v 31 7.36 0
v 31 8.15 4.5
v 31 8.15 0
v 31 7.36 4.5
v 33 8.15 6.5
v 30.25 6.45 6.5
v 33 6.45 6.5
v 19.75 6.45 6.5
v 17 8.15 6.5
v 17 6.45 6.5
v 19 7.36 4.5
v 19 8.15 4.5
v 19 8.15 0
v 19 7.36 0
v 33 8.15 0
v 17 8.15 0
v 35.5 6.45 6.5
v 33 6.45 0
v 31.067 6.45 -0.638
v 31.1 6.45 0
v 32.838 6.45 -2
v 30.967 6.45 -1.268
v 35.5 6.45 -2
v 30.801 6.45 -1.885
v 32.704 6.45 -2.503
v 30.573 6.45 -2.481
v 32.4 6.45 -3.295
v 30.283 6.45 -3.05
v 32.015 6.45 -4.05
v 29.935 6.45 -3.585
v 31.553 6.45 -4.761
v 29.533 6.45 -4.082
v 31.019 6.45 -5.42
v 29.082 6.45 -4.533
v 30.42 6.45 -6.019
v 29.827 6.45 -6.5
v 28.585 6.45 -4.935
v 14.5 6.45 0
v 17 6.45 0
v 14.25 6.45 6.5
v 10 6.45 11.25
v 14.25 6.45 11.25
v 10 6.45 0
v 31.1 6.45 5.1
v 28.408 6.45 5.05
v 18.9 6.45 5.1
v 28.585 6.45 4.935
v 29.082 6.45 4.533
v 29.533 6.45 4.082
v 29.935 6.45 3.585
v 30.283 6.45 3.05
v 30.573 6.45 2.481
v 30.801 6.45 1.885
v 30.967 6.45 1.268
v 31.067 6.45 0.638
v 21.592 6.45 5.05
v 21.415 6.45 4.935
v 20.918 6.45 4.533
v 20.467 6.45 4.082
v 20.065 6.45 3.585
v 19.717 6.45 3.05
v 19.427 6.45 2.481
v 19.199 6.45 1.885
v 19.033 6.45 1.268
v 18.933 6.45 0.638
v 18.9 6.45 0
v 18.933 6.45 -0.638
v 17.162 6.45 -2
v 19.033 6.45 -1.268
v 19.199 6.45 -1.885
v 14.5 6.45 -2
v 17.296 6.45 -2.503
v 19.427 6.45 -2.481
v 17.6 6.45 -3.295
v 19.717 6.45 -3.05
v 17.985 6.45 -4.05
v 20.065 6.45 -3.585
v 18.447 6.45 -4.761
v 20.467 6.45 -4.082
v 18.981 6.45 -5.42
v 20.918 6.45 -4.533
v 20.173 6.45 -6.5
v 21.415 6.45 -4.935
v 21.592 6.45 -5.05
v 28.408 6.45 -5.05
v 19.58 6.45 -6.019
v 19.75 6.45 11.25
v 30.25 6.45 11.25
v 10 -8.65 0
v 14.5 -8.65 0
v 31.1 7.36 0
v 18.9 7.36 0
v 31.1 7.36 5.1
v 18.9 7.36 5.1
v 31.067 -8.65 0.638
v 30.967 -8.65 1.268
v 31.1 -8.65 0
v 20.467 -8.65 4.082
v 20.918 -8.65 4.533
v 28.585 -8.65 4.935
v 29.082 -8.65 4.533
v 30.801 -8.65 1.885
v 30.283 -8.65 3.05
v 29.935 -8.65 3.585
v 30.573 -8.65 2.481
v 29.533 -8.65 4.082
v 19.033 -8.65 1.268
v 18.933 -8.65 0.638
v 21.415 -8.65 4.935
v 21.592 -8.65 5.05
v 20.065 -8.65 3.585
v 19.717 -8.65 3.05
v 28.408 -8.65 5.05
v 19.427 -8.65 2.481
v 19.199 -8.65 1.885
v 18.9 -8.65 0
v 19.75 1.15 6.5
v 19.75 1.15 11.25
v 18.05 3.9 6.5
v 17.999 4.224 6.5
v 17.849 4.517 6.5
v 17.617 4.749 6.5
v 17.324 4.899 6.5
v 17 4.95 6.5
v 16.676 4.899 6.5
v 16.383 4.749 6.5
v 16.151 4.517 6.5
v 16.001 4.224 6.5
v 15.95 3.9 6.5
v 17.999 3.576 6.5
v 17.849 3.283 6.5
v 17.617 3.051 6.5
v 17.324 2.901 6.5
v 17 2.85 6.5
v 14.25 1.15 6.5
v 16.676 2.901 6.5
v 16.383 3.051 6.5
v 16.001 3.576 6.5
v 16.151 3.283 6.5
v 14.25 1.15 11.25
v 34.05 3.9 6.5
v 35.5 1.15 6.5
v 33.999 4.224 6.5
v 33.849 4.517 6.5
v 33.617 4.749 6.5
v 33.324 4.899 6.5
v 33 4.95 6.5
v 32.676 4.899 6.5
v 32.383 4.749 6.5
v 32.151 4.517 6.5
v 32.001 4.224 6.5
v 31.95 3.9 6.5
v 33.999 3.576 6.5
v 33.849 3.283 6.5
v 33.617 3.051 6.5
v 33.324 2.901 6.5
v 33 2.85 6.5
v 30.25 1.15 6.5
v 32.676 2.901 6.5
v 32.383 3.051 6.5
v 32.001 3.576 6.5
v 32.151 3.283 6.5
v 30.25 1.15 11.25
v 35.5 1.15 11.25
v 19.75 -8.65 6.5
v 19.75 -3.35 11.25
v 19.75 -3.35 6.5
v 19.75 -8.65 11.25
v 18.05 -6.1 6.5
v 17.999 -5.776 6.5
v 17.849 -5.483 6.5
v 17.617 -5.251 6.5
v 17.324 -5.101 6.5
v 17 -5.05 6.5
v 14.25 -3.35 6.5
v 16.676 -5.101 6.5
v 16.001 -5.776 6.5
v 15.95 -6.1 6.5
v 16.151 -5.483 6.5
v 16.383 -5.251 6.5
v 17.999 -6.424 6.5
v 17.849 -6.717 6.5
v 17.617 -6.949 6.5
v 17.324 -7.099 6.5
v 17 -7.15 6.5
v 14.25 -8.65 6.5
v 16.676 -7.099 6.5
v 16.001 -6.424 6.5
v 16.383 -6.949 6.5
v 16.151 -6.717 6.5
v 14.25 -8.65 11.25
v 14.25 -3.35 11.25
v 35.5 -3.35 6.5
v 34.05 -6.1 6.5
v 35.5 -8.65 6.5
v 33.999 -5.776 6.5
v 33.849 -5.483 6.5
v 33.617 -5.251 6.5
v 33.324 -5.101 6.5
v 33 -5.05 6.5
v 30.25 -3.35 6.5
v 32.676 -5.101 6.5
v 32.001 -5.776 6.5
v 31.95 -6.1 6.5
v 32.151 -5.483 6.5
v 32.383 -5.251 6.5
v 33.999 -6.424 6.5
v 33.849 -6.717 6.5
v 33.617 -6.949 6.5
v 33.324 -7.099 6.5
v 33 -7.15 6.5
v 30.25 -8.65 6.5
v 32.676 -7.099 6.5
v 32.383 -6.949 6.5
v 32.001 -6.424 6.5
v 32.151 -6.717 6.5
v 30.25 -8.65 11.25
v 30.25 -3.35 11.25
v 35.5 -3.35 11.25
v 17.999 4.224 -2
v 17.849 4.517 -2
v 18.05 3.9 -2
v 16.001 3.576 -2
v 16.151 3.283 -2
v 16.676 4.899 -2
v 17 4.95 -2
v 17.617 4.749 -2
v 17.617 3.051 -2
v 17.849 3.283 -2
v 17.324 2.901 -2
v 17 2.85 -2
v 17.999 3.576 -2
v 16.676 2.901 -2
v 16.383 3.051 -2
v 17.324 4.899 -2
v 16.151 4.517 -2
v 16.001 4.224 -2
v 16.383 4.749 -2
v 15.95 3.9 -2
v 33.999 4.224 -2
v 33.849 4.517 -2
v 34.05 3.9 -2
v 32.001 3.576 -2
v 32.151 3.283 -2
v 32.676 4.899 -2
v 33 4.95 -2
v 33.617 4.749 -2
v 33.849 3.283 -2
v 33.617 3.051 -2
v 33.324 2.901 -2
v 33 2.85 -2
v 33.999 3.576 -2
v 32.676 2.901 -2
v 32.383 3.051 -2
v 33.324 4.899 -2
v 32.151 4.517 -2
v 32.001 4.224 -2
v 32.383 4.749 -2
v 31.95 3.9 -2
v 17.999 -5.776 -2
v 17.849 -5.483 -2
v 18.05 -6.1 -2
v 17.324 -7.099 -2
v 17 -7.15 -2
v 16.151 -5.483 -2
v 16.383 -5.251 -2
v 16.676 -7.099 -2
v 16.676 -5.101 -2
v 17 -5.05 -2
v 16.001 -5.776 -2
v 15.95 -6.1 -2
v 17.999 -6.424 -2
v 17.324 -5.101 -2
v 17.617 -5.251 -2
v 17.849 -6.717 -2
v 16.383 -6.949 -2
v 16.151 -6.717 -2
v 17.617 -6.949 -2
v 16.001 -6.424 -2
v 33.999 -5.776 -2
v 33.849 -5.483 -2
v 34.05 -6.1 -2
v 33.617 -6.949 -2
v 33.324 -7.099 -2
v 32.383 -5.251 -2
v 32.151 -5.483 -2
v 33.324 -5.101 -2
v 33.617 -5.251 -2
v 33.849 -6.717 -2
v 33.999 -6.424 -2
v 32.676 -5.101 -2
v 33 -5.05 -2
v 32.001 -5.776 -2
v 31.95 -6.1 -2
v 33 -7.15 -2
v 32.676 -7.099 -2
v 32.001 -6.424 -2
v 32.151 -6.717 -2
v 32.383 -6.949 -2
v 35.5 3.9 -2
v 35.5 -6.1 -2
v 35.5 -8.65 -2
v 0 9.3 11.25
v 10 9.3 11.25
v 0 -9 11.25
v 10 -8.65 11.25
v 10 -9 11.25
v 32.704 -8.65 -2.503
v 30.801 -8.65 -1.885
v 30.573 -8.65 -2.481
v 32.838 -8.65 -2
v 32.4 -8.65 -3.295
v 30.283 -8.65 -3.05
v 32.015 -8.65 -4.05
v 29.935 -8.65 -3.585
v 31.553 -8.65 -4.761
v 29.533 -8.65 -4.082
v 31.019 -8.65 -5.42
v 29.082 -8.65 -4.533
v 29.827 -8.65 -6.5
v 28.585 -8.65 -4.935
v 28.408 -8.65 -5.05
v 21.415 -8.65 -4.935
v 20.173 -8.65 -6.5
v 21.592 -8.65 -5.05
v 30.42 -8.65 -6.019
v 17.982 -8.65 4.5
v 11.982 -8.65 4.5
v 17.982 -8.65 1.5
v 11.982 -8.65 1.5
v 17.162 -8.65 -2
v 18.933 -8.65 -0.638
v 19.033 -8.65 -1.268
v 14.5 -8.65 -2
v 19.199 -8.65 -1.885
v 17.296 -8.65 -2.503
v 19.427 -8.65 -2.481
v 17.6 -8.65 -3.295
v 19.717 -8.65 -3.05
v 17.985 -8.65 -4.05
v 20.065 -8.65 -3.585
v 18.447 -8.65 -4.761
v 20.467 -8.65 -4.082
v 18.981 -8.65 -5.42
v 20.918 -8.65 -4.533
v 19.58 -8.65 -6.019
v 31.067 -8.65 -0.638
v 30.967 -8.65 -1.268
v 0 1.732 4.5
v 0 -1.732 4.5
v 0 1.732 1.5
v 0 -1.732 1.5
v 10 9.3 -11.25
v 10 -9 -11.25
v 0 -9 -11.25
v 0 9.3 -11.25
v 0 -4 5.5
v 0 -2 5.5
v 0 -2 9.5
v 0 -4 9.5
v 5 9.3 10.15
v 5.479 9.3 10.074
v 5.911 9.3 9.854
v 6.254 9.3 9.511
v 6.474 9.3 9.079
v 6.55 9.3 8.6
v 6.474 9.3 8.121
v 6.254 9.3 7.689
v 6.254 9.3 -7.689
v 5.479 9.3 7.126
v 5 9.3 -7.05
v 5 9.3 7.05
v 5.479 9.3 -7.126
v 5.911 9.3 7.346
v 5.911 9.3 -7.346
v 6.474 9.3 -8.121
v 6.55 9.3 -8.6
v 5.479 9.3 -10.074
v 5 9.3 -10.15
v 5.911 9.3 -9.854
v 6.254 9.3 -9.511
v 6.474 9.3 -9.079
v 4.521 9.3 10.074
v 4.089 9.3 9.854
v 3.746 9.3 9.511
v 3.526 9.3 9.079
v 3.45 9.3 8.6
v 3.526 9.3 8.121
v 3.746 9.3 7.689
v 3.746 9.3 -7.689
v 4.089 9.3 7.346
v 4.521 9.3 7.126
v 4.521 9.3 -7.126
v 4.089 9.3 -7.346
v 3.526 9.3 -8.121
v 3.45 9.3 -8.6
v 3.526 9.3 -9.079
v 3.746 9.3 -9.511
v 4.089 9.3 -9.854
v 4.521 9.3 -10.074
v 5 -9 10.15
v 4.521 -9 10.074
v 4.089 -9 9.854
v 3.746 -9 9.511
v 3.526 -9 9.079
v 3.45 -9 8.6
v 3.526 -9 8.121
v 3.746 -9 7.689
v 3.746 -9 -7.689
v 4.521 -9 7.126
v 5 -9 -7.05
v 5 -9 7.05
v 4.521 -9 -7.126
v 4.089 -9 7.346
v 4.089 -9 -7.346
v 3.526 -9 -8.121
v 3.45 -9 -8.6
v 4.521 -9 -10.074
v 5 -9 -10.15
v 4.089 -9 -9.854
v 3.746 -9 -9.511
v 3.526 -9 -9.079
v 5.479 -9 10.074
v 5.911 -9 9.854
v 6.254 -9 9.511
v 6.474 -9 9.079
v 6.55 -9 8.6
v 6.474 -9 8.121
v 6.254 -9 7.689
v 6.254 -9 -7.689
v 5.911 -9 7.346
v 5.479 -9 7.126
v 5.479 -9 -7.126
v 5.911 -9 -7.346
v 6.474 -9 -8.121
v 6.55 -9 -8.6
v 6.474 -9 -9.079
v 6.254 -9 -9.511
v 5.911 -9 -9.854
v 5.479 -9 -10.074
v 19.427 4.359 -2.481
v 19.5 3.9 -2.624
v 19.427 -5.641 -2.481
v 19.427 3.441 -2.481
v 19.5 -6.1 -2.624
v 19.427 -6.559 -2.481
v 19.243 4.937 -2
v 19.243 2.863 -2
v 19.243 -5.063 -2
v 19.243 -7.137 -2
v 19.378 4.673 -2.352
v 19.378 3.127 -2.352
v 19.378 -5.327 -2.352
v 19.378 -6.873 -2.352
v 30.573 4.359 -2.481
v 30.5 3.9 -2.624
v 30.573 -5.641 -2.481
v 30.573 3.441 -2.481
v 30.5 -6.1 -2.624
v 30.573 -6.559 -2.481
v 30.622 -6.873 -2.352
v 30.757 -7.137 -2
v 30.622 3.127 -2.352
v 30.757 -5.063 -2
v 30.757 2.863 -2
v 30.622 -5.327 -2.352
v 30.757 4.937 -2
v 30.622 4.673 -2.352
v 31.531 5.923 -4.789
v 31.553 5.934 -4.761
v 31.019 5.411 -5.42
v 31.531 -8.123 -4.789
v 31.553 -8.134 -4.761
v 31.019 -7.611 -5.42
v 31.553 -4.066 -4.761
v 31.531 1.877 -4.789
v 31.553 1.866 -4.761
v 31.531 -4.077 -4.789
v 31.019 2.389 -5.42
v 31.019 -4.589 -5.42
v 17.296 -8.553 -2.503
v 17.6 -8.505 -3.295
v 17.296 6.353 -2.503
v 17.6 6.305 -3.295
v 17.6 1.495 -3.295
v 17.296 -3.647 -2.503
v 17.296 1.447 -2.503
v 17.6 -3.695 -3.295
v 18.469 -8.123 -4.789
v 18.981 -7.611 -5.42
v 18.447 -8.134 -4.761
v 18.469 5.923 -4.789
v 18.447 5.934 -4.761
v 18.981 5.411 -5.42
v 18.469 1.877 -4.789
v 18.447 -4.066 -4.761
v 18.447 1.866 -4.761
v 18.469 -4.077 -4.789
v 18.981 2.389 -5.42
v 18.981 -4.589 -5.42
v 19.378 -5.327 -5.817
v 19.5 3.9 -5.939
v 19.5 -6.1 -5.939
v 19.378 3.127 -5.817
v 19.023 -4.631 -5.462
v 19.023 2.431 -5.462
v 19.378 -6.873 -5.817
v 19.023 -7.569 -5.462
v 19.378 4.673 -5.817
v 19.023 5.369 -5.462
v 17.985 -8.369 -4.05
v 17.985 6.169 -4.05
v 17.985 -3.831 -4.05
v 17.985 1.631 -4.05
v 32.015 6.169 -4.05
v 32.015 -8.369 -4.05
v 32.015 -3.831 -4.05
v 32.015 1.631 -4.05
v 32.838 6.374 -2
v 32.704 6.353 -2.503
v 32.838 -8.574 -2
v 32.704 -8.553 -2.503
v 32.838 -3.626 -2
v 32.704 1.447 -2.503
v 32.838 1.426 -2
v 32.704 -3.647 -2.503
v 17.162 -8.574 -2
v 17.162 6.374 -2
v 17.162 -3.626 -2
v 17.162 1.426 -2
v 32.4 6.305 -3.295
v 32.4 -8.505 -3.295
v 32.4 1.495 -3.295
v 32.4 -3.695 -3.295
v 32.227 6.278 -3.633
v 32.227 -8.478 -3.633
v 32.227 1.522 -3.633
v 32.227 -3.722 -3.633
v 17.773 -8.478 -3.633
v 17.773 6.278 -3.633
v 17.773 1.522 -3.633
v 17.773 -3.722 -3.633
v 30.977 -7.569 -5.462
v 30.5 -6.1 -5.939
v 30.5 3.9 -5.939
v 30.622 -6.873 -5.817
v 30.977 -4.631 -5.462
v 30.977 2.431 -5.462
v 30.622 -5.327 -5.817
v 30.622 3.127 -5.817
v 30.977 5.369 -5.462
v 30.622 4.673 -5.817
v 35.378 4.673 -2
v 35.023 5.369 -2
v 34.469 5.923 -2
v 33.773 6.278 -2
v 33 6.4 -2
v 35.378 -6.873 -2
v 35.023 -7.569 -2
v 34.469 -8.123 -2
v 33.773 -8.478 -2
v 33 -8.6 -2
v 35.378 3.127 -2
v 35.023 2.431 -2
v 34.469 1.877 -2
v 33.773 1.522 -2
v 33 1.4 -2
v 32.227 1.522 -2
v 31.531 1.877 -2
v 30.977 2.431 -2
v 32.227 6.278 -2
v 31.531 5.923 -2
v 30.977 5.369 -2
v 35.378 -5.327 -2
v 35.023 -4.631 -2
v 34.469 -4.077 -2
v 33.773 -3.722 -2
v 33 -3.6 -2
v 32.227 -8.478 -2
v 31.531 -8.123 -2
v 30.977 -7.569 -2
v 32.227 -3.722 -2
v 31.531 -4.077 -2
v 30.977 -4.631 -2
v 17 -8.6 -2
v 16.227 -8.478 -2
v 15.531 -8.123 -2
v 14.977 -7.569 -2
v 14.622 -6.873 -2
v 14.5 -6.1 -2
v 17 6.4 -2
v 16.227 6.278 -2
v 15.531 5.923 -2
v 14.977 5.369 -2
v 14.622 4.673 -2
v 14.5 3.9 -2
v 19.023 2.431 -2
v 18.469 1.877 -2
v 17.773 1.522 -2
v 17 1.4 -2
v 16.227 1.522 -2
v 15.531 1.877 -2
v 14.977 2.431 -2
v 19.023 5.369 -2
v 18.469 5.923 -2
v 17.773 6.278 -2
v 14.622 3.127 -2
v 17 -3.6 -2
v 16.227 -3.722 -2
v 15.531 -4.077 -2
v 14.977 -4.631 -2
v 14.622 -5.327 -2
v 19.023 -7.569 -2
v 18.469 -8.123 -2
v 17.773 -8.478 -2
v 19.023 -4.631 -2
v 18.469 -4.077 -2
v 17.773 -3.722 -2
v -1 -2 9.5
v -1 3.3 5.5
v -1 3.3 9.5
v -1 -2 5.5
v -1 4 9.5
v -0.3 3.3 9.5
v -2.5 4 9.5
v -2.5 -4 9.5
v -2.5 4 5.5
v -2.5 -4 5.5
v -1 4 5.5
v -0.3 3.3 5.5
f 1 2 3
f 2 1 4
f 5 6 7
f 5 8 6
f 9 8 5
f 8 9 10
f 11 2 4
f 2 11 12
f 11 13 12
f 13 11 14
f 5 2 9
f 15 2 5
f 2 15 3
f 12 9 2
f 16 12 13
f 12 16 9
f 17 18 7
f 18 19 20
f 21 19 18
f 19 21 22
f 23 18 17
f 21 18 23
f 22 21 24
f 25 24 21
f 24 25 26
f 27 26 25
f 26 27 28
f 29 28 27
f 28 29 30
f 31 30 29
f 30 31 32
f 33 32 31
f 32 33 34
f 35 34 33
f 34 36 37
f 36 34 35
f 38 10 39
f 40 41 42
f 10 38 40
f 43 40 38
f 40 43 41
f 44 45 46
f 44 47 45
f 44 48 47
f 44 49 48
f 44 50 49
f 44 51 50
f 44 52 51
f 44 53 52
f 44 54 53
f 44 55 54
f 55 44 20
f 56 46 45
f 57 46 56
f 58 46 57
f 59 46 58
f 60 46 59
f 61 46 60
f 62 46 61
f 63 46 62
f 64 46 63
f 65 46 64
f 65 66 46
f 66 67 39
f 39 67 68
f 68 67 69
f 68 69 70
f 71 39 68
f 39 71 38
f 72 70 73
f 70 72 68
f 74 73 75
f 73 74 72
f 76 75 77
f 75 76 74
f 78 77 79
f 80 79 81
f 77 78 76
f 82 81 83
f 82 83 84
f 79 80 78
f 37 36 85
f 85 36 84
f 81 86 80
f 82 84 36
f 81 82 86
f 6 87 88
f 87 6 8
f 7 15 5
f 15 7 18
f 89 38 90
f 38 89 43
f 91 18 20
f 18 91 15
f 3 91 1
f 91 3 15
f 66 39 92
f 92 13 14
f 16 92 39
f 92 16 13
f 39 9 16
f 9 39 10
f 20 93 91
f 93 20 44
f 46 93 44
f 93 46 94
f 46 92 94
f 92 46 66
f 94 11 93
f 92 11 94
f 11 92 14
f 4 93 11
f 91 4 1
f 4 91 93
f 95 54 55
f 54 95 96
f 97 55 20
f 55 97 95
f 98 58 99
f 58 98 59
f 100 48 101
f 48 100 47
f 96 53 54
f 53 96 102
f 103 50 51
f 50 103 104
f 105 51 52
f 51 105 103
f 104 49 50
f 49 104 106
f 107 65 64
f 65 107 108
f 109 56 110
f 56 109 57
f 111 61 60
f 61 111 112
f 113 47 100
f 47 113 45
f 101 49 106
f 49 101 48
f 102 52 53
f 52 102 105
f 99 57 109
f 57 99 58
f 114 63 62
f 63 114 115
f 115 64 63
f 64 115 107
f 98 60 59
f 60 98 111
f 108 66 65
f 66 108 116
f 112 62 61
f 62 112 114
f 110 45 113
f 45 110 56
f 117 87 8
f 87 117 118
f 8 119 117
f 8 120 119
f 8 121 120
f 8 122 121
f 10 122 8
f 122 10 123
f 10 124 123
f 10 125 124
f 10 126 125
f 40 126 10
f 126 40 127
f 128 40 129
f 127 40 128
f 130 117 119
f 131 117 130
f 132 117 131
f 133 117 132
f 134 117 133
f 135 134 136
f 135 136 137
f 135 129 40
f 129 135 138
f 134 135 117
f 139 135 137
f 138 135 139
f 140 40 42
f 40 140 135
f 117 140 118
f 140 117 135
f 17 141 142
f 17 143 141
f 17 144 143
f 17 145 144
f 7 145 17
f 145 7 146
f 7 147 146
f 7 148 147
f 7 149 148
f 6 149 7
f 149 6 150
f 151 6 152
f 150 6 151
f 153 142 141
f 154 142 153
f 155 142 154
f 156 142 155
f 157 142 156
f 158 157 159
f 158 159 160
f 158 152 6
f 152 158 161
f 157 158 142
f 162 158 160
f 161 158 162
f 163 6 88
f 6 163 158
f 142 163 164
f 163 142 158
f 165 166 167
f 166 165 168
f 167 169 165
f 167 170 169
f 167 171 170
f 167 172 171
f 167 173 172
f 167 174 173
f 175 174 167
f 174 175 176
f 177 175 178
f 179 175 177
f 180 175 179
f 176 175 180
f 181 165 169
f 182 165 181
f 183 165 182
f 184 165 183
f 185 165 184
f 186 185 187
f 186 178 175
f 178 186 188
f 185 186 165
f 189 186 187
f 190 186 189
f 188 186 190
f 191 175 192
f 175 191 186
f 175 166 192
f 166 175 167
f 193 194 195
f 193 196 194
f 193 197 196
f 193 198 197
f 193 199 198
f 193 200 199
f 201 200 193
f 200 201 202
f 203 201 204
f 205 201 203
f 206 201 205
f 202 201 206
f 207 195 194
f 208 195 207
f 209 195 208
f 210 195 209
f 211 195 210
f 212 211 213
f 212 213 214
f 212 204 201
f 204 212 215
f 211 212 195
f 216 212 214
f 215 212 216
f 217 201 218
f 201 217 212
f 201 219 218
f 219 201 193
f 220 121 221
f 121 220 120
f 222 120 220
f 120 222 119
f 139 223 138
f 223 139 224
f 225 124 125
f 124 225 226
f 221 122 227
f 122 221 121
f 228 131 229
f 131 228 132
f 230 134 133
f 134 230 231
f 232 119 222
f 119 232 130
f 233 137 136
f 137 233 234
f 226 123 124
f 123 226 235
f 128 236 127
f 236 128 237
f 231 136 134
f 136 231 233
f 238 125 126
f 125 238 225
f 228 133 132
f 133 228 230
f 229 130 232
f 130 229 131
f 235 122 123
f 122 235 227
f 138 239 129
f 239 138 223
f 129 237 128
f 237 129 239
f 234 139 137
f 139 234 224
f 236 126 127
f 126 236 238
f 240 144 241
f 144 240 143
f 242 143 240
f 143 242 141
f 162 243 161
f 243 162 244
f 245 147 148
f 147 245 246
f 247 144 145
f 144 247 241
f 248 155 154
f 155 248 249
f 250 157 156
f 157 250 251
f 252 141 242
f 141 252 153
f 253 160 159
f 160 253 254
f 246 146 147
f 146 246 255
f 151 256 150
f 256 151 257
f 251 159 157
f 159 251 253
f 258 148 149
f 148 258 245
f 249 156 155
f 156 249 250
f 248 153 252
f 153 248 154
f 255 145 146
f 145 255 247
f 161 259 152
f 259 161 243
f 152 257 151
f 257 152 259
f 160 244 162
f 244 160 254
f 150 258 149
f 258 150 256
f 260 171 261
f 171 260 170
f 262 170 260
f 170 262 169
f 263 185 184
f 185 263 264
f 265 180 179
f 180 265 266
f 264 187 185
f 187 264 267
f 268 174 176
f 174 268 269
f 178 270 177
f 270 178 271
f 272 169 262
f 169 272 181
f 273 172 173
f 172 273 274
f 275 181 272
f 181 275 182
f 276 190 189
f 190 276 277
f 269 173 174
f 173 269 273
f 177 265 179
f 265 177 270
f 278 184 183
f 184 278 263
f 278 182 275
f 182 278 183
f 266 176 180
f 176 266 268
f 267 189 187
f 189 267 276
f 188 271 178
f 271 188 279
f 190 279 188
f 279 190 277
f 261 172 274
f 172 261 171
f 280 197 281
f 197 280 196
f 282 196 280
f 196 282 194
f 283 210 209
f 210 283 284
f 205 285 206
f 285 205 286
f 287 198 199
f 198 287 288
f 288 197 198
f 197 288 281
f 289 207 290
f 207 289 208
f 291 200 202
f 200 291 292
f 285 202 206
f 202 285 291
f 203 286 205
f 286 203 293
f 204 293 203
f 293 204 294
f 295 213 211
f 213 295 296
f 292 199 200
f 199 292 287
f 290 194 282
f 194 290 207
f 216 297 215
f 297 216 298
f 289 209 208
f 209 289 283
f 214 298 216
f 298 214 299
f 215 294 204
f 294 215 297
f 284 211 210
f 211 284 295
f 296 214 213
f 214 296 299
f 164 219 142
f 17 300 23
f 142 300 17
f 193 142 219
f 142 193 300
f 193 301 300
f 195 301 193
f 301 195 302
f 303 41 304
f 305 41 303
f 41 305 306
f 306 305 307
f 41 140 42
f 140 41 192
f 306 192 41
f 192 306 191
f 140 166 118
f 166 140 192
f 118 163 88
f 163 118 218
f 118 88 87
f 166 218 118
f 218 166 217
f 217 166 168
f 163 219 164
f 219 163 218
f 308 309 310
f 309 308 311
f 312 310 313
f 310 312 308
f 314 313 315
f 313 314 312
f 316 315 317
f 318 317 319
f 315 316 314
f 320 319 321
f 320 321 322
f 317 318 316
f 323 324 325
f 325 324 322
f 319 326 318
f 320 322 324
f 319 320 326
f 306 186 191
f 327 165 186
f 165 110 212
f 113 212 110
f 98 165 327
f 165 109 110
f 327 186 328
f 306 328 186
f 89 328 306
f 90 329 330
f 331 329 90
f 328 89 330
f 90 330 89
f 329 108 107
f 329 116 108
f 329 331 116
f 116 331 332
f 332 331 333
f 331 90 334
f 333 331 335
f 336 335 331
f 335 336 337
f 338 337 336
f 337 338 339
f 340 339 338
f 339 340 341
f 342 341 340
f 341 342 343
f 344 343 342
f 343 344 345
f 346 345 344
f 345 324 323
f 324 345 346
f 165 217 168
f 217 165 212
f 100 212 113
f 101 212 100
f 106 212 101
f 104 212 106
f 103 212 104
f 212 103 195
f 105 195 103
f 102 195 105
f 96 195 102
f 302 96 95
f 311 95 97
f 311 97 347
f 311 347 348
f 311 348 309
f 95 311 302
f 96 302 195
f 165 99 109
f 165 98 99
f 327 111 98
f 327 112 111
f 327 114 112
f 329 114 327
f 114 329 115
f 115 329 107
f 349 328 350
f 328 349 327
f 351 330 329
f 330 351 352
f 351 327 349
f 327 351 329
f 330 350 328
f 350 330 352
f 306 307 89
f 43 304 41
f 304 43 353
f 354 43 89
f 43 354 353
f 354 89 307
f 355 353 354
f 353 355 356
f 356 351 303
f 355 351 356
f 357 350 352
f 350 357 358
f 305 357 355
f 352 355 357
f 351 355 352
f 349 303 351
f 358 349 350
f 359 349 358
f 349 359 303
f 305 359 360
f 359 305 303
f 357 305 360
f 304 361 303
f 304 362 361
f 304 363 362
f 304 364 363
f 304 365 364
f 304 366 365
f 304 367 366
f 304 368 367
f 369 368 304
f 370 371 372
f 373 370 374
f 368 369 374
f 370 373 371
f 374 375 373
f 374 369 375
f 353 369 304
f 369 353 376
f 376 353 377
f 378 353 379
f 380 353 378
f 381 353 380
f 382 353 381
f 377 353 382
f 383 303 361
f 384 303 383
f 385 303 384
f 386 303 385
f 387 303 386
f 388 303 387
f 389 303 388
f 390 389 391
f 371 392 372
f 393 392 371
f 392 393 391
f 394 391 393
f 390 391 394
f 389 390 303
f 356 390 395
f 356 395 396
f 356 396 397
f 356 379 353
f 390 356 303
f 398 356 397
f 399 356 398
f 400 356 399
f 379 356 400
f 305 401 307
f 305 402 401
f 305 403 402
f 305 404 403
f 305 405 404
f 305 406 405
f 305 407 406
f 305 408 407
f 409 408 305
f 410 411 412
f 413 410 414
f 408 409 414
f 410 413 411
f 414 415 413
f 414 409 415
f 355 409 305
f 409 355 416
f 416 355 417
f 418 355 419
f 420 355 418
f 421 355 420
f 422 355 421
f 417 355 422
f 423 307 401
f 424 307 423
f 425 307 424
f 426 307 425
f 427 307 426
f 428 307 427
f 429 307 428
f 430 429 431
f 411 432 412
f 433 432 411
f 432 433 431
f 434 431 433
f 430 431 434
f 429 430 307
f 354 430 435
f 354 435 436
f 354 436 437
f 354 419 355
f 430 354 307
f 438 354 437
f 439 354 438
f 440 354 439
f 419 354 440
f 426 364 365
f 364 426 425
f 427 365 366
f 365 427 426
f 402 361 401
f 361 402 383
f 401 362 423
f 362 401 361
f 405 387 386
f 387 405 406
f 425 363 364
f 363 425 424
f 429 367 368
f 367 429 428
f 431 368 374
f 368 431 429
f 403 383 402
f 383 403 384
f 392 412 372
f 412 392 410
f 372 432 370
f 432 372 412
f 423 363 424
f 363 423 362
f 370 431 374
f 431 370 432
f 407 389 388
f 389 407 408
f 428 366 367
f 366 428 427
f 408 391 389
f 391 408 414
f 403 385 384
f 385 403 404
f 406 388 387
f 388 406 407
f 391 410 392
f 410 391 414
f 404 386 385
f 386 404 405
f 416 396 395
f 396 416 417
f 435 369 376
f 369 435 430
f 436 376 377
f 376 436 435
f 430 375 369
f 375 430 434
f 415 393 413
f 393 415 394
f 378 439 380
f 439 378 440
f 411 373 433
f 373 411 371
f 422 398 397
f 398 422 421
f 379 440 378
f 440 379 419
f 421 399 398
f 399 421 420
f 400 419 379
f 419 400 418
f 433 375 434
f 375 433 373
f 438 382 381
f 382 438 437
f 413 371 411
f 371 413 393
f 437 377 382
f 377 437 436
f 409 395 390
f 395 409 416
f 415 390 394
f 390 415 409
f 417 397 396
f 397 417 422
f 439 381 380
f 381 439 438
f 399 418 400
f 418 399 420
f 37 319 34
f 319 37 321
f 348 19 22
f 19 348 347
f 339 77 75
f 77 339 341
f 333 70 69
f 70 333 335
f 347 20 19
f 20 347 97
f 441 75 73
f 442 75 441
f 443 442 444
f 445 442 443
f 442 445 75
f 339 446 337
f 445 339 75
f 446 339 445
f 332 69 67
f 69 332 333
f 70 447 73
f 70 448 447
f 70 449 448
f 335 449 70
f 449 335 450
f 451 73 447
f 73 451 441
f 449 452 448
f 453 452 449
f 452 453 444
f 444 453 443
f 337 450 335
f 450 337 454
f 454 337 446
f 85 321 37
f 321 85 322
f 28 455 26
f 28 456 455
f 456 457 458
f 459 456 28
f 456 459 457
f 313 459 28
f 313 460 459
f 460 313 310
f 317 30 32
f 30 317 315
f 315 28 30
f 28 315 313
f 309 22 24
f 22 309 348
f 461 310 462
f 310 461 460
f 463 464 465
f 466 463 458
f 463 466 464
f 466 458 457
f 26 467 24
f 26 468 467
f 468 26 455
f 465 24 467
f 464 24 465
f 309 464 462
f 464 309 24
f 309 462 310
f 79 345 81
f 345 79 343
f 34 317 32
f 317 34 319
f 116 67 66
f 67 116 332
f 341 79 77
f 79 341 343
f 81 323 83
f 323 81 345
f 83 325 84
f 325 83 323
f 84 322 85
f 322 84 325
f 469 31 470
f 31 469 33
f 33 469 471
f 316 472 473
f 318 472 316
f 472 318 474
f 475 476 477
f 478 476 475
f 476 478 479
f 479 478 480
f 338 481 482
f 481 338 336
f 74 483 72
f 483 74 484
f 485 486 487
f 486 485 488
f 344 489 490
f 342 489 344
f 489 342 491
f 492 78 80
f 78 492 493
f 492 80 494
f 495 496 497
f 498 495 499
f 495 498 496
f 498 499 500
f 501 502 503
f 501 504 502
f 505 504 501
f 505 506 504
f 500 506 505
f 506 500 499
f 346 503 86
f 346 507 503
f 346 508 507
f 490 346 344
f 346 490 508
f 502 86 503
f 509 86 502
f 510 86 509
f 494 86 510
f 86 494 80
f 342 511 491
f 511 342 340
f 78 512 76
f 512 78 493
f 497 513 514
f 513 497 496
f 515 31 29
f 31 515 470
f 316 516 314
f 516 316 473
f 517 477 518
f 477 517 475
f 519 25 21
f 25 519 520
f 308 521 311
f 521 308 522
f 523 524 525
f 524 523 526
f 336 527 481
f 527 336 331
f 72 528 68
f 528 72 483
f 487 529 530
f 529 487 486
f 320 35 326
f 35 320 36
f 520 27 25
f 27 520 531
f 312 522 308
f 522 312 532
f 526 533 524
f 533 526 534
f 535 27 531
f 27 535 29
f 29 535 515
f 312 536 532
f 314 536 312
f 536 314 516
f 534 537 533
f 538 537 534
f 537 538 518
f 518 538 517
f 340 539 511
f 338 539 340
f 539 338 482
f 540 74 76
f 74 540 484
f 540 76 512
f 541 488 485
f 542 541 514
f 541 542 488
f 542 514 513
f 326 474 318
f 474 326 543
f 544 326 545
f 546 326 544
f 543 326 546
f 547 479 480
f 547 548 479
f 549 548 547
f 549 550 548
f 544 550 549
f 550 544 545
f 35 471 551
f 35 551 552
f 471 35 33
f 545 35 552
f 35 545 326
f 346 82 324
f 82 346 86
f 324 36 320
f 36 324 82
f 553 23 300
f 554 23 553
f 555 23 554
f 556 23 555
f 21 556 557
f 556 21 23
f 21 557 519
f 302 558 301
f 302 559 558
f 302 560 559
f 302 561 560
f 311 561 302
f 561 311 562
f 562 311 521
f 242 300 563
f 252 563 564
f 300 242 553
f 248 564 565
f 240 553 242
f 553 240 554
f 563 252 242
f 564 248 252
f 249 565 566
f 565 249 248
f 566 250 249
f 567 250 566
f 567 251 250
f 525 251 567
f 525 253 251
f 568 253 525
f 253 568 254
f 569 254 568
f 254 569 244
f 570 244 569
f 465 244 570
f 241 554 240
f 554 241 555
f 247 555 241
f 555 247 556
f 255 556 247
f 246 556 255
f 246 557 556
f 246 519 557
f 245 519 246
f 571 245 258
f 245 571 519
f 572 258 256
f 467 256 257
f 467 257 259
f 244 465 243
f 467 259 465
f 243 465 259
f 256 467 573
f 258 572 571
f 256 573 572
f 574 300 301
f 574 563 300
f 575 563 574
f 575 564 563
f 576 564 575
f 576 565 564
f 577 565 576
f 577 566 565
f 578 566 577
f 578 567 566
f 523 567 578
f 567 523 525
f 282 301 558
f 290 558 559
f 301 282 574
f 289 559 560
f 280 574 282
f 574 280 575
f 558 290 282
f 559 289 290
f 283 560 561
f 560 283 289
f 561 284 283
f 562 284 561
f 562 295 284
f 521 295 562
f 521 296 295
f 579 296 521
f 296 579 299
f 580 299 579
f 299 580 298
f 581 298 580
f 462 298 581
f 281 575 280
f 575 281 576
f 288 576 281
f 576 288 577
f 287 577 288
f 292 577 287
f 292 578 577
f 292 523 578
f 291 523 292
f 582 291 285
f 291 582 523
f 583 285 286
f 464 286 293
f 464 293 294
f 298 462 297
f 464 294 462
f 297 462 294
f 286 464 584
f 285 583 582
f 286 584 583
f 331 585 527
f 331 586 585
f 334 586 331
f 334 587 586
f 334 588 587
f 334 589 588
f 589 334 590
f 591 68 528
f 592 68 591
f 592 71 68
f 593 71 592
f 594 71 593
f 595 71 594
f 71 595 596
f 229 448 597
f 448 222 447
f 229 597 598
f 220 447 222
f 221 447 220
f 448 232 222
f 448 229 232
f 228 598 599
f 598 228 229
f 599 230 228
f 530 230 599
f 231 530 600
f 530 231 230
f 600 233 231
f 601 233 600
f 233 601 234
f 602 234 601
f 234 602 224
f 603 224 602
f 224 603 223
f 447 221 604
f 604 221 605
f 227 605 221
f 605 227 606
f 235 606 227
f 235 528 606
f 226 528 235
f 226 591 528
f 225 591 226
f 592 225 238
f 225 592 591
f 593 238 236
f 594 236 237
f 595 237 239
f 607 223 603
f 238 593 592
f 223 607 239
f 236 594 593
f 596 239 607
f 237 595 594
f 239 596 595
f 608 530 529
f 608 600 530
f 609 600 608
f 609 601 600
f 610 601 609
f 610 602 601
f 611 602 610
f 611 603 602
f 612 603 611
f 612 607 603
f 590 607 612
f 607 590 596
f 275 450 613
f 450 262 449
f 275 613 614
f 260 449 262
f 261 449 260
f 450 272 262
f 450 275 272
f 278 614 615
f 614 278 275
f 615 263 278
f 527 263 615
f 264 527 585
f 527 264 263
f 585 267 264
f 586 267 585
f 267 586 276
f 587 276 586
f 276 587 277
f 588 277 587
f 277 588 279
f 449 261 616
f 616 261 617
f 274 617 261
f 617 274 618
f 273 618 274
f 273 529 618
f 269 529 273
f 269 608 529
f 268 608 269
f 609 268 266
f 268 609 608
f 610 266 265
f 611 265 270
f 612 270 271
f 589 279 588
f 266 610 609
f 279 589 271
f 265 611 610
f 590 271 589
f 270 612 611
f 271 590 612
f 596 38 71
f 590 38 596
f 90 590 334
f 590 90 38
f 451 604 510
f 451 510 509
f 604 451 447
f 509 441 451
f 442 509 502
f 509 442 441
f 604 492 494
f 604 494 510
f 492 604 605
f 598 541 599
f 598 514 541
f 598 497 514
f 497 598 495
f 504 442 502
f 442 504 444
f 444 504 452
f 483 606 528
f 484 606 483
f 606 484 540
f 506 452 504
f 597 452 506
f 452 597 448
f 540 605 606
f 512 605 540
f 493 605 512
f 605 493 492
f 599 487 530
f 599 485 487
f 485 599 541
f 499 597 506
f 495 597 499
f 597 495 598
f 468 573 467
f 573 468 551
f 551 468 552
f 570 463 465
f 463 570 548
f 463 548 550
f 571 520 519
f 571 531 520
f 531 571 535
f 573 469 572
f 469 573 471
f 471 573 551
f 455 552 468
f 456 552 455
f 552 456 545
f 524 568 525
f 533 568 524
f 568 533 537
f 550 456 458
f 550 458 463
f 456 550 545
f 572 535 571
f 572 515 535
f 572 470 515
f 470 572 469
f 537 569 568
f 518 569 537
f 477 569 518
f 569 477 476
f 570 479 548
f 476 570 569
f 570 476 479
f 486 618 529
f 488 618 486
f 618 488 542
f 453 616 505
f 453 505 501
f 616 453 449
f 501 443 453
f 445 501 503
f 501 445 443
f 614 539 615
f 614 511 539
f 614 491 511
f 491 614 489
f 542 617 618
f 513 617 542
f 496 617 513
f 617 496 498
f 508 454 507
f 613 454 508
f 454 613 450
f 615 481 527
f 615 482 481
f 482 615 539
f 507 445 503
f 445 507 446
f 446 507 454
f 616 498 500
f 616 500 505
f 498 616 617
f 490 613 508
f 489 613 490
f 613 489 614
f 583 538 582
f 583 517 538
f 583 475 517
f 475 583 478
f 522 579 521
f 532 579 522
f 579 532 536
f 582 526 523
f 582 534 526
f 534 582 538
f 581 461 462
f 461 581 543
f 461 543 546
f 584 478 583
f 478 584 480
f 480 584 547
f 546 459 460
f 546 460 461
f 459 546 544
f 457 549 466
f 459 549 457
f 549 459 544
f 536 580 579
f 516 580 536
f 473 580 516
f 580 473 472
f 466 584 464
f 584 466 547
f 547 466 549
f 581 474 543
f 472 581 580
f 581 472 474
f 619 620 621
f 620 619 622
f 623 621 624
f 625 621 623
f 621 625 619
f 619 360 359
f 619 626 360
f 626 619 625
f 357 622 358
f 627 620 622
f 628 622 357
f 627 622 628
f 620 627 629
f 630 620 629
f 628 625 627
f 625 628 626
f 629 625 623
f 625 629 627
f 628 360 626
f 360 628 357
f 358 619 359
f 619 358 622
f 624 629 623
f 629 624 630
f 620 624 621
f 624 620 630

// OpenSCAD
module prism(l, w, h){
   polyhedron(
           points=[[0,0,0], [l,0,0], [l,w,0], [0,w,0], [0,w,h], [l,w,h]],
           faces=[[0,1,2,3],[5,4,3,2],[0,4,5,1],[0,3,4],[5,2,1]]
           );
}


// This is a simplified version of the main body of the motor housing

module motor() {
color("pink")

difference() {translate([0,-1.1,0]) rotate([90,0,0]) cylinder(h=15.1, d=12.2, center=true, $fn=60);


translate([-1,-1.1,8.125]) cube([20,15.1,6.15], center=true);

translate([-1,-1.1,-8.125])  cube([20,15.1,6.15], center=true);
}}




// These are the cutouts for the screw holes and the space for the nuts

module n20_mount_cutout() {

translate([25,-1.10,0])
{


translate([-8,5,0])
cylinder(h=40, d=2.1, center=true, $fn=20);

translate([8,5,0])
cylinder(h=40, d=2.1, center=true, $fn=20);

translate([-8,-5,0])
cylinder(h=40, d=2.1, center=true, $fn=20);

translate([8,-5,0])
cylinder(h=40, d=2.1, center=true, $fn=20);

translate([0,0,11.5]) {

translate([-8,5,0])
cube([5.5,5.5,10], center=true);

translate([8,5,0])
cube([5.5,5.5,10], center=true);

translate([-8,-5,0])
cube([5.5,5.5,10], center=true);

translate([8,-5,0])
cube([5.5,5.5,10], center=true);
}
}
}

//****************************************************************************

// Here begins the top part of the motor mount (the complicated bit)


// This is the little clamping feature that holds the front of the motor

difference() {
union() {
translate([25,7.3,5.5]) color("green") cube([12,1.7,2], center=true);

translate([32,7.3,3.25]) color("green") cube([2,1.7,6.5], center=true);

translate([18,7.3,3.25]) color("green") cube([2,1.7,6.5], center=true);

}

// This represents the first brass plate of the gearbox (the part which is being clamped)
translate([25,6.9,0.05]) color("pink") cube([12.2,0.92,10.1], center=true);

}


// This is a shaft that gets cut out to allow wires to pass through

module wire_shaft() {
translate([0,0,3])
rotate([0,0,-30])
cube([60,3,3], center=true);
}


// This is the large block which abuts the underside of the robot and supports the motor

difference() {
translate([22.5,-1.1,8.125 -2.5 ]) color("magenta") cube([26,15.1,6.25 + 5], center=true);
translate([25,0,0]) scale([1,2,1]) motor();

n20_mount_cutout();
wire_shaft();

}

// This is the other large block, that has the big M3 screws through it for attaching to the TT motor mount

difference() {
translate([5,0.15,0]) color("green") cube([10,18.3,22.5], center=true);

translate([5,0,8.6]) rotate([90,0,0]) cylinder(h=40, d=3.1, center=true, $fn=20);


translate([5,0,-8.6]) rotate([90,0,0]) cylinder(h=40, d=3.1, center=true, $fn=20);
wire_shaft();
}

// This is the little clip to hold the wires and provide a litle strain relief on the back

translate([-1.75,0,7.5])
cube([1.5,8,4],center=true);

translate([0,-3,7.5])
cube([2,2,4],center=true);

   translate([-0.3,3.3,9.5])
rotate([0,90,90])
   prism(4, 0.7, 0.7);

//****************************************************************************

// From here onwards is the bottom bracket

color("red")
difference() {
union() {
translate([25,0,0])
difference() {
translate([0,-1.1,0]) rotate([90,0,0]) cylinder(h=15.1, d=16.2, center=true, $fn=60);
translate([-1,-1.1,5]) cube([20,16,10], center=true);
translate([-1,-1.1,-11.5]) cube([20,16.1,10], center=true);
 scale([1,2,1]) motor();
}

translate([25,0,0])
difference() {
translate([0,-1.1,-1])
cube([21,15.1,2], center=true);
translate([0,-1.1,0]) rotate([90,0,0]) cylinder(h=16, d=12.2, center=true, $fn=60);
}

}

translate([25,-1.10,0])
{


translate([-8,5,0])
cylinder(h=40, d=2.1, center=true, $fn=20);

translate([8,5,0])
cylinder(h=40, d=2.1, center=true, $fn=20);

translate([-8,-5,0])
cylinder(h=40, d=2.1, center=true, $fn=20);

translate([8,-5,0])
cylinder(h=40, d=2.1, center=true, $fn=20);
}


translate([25,-1.10,-22])
{


translate([-8,5,0])
cylinder(h=40, d=5, center=true, $fn=20);

translate([8,5,0])
cylinder(h=40, d=5, center=true, $fn=20);

translate([-8,-5,0])
cylinder(h=40, d=5, center=true, $fn=20);

translate([8,-5,0])
cylinder(h=40, d=5, center=true, $fn=20);
}

}
